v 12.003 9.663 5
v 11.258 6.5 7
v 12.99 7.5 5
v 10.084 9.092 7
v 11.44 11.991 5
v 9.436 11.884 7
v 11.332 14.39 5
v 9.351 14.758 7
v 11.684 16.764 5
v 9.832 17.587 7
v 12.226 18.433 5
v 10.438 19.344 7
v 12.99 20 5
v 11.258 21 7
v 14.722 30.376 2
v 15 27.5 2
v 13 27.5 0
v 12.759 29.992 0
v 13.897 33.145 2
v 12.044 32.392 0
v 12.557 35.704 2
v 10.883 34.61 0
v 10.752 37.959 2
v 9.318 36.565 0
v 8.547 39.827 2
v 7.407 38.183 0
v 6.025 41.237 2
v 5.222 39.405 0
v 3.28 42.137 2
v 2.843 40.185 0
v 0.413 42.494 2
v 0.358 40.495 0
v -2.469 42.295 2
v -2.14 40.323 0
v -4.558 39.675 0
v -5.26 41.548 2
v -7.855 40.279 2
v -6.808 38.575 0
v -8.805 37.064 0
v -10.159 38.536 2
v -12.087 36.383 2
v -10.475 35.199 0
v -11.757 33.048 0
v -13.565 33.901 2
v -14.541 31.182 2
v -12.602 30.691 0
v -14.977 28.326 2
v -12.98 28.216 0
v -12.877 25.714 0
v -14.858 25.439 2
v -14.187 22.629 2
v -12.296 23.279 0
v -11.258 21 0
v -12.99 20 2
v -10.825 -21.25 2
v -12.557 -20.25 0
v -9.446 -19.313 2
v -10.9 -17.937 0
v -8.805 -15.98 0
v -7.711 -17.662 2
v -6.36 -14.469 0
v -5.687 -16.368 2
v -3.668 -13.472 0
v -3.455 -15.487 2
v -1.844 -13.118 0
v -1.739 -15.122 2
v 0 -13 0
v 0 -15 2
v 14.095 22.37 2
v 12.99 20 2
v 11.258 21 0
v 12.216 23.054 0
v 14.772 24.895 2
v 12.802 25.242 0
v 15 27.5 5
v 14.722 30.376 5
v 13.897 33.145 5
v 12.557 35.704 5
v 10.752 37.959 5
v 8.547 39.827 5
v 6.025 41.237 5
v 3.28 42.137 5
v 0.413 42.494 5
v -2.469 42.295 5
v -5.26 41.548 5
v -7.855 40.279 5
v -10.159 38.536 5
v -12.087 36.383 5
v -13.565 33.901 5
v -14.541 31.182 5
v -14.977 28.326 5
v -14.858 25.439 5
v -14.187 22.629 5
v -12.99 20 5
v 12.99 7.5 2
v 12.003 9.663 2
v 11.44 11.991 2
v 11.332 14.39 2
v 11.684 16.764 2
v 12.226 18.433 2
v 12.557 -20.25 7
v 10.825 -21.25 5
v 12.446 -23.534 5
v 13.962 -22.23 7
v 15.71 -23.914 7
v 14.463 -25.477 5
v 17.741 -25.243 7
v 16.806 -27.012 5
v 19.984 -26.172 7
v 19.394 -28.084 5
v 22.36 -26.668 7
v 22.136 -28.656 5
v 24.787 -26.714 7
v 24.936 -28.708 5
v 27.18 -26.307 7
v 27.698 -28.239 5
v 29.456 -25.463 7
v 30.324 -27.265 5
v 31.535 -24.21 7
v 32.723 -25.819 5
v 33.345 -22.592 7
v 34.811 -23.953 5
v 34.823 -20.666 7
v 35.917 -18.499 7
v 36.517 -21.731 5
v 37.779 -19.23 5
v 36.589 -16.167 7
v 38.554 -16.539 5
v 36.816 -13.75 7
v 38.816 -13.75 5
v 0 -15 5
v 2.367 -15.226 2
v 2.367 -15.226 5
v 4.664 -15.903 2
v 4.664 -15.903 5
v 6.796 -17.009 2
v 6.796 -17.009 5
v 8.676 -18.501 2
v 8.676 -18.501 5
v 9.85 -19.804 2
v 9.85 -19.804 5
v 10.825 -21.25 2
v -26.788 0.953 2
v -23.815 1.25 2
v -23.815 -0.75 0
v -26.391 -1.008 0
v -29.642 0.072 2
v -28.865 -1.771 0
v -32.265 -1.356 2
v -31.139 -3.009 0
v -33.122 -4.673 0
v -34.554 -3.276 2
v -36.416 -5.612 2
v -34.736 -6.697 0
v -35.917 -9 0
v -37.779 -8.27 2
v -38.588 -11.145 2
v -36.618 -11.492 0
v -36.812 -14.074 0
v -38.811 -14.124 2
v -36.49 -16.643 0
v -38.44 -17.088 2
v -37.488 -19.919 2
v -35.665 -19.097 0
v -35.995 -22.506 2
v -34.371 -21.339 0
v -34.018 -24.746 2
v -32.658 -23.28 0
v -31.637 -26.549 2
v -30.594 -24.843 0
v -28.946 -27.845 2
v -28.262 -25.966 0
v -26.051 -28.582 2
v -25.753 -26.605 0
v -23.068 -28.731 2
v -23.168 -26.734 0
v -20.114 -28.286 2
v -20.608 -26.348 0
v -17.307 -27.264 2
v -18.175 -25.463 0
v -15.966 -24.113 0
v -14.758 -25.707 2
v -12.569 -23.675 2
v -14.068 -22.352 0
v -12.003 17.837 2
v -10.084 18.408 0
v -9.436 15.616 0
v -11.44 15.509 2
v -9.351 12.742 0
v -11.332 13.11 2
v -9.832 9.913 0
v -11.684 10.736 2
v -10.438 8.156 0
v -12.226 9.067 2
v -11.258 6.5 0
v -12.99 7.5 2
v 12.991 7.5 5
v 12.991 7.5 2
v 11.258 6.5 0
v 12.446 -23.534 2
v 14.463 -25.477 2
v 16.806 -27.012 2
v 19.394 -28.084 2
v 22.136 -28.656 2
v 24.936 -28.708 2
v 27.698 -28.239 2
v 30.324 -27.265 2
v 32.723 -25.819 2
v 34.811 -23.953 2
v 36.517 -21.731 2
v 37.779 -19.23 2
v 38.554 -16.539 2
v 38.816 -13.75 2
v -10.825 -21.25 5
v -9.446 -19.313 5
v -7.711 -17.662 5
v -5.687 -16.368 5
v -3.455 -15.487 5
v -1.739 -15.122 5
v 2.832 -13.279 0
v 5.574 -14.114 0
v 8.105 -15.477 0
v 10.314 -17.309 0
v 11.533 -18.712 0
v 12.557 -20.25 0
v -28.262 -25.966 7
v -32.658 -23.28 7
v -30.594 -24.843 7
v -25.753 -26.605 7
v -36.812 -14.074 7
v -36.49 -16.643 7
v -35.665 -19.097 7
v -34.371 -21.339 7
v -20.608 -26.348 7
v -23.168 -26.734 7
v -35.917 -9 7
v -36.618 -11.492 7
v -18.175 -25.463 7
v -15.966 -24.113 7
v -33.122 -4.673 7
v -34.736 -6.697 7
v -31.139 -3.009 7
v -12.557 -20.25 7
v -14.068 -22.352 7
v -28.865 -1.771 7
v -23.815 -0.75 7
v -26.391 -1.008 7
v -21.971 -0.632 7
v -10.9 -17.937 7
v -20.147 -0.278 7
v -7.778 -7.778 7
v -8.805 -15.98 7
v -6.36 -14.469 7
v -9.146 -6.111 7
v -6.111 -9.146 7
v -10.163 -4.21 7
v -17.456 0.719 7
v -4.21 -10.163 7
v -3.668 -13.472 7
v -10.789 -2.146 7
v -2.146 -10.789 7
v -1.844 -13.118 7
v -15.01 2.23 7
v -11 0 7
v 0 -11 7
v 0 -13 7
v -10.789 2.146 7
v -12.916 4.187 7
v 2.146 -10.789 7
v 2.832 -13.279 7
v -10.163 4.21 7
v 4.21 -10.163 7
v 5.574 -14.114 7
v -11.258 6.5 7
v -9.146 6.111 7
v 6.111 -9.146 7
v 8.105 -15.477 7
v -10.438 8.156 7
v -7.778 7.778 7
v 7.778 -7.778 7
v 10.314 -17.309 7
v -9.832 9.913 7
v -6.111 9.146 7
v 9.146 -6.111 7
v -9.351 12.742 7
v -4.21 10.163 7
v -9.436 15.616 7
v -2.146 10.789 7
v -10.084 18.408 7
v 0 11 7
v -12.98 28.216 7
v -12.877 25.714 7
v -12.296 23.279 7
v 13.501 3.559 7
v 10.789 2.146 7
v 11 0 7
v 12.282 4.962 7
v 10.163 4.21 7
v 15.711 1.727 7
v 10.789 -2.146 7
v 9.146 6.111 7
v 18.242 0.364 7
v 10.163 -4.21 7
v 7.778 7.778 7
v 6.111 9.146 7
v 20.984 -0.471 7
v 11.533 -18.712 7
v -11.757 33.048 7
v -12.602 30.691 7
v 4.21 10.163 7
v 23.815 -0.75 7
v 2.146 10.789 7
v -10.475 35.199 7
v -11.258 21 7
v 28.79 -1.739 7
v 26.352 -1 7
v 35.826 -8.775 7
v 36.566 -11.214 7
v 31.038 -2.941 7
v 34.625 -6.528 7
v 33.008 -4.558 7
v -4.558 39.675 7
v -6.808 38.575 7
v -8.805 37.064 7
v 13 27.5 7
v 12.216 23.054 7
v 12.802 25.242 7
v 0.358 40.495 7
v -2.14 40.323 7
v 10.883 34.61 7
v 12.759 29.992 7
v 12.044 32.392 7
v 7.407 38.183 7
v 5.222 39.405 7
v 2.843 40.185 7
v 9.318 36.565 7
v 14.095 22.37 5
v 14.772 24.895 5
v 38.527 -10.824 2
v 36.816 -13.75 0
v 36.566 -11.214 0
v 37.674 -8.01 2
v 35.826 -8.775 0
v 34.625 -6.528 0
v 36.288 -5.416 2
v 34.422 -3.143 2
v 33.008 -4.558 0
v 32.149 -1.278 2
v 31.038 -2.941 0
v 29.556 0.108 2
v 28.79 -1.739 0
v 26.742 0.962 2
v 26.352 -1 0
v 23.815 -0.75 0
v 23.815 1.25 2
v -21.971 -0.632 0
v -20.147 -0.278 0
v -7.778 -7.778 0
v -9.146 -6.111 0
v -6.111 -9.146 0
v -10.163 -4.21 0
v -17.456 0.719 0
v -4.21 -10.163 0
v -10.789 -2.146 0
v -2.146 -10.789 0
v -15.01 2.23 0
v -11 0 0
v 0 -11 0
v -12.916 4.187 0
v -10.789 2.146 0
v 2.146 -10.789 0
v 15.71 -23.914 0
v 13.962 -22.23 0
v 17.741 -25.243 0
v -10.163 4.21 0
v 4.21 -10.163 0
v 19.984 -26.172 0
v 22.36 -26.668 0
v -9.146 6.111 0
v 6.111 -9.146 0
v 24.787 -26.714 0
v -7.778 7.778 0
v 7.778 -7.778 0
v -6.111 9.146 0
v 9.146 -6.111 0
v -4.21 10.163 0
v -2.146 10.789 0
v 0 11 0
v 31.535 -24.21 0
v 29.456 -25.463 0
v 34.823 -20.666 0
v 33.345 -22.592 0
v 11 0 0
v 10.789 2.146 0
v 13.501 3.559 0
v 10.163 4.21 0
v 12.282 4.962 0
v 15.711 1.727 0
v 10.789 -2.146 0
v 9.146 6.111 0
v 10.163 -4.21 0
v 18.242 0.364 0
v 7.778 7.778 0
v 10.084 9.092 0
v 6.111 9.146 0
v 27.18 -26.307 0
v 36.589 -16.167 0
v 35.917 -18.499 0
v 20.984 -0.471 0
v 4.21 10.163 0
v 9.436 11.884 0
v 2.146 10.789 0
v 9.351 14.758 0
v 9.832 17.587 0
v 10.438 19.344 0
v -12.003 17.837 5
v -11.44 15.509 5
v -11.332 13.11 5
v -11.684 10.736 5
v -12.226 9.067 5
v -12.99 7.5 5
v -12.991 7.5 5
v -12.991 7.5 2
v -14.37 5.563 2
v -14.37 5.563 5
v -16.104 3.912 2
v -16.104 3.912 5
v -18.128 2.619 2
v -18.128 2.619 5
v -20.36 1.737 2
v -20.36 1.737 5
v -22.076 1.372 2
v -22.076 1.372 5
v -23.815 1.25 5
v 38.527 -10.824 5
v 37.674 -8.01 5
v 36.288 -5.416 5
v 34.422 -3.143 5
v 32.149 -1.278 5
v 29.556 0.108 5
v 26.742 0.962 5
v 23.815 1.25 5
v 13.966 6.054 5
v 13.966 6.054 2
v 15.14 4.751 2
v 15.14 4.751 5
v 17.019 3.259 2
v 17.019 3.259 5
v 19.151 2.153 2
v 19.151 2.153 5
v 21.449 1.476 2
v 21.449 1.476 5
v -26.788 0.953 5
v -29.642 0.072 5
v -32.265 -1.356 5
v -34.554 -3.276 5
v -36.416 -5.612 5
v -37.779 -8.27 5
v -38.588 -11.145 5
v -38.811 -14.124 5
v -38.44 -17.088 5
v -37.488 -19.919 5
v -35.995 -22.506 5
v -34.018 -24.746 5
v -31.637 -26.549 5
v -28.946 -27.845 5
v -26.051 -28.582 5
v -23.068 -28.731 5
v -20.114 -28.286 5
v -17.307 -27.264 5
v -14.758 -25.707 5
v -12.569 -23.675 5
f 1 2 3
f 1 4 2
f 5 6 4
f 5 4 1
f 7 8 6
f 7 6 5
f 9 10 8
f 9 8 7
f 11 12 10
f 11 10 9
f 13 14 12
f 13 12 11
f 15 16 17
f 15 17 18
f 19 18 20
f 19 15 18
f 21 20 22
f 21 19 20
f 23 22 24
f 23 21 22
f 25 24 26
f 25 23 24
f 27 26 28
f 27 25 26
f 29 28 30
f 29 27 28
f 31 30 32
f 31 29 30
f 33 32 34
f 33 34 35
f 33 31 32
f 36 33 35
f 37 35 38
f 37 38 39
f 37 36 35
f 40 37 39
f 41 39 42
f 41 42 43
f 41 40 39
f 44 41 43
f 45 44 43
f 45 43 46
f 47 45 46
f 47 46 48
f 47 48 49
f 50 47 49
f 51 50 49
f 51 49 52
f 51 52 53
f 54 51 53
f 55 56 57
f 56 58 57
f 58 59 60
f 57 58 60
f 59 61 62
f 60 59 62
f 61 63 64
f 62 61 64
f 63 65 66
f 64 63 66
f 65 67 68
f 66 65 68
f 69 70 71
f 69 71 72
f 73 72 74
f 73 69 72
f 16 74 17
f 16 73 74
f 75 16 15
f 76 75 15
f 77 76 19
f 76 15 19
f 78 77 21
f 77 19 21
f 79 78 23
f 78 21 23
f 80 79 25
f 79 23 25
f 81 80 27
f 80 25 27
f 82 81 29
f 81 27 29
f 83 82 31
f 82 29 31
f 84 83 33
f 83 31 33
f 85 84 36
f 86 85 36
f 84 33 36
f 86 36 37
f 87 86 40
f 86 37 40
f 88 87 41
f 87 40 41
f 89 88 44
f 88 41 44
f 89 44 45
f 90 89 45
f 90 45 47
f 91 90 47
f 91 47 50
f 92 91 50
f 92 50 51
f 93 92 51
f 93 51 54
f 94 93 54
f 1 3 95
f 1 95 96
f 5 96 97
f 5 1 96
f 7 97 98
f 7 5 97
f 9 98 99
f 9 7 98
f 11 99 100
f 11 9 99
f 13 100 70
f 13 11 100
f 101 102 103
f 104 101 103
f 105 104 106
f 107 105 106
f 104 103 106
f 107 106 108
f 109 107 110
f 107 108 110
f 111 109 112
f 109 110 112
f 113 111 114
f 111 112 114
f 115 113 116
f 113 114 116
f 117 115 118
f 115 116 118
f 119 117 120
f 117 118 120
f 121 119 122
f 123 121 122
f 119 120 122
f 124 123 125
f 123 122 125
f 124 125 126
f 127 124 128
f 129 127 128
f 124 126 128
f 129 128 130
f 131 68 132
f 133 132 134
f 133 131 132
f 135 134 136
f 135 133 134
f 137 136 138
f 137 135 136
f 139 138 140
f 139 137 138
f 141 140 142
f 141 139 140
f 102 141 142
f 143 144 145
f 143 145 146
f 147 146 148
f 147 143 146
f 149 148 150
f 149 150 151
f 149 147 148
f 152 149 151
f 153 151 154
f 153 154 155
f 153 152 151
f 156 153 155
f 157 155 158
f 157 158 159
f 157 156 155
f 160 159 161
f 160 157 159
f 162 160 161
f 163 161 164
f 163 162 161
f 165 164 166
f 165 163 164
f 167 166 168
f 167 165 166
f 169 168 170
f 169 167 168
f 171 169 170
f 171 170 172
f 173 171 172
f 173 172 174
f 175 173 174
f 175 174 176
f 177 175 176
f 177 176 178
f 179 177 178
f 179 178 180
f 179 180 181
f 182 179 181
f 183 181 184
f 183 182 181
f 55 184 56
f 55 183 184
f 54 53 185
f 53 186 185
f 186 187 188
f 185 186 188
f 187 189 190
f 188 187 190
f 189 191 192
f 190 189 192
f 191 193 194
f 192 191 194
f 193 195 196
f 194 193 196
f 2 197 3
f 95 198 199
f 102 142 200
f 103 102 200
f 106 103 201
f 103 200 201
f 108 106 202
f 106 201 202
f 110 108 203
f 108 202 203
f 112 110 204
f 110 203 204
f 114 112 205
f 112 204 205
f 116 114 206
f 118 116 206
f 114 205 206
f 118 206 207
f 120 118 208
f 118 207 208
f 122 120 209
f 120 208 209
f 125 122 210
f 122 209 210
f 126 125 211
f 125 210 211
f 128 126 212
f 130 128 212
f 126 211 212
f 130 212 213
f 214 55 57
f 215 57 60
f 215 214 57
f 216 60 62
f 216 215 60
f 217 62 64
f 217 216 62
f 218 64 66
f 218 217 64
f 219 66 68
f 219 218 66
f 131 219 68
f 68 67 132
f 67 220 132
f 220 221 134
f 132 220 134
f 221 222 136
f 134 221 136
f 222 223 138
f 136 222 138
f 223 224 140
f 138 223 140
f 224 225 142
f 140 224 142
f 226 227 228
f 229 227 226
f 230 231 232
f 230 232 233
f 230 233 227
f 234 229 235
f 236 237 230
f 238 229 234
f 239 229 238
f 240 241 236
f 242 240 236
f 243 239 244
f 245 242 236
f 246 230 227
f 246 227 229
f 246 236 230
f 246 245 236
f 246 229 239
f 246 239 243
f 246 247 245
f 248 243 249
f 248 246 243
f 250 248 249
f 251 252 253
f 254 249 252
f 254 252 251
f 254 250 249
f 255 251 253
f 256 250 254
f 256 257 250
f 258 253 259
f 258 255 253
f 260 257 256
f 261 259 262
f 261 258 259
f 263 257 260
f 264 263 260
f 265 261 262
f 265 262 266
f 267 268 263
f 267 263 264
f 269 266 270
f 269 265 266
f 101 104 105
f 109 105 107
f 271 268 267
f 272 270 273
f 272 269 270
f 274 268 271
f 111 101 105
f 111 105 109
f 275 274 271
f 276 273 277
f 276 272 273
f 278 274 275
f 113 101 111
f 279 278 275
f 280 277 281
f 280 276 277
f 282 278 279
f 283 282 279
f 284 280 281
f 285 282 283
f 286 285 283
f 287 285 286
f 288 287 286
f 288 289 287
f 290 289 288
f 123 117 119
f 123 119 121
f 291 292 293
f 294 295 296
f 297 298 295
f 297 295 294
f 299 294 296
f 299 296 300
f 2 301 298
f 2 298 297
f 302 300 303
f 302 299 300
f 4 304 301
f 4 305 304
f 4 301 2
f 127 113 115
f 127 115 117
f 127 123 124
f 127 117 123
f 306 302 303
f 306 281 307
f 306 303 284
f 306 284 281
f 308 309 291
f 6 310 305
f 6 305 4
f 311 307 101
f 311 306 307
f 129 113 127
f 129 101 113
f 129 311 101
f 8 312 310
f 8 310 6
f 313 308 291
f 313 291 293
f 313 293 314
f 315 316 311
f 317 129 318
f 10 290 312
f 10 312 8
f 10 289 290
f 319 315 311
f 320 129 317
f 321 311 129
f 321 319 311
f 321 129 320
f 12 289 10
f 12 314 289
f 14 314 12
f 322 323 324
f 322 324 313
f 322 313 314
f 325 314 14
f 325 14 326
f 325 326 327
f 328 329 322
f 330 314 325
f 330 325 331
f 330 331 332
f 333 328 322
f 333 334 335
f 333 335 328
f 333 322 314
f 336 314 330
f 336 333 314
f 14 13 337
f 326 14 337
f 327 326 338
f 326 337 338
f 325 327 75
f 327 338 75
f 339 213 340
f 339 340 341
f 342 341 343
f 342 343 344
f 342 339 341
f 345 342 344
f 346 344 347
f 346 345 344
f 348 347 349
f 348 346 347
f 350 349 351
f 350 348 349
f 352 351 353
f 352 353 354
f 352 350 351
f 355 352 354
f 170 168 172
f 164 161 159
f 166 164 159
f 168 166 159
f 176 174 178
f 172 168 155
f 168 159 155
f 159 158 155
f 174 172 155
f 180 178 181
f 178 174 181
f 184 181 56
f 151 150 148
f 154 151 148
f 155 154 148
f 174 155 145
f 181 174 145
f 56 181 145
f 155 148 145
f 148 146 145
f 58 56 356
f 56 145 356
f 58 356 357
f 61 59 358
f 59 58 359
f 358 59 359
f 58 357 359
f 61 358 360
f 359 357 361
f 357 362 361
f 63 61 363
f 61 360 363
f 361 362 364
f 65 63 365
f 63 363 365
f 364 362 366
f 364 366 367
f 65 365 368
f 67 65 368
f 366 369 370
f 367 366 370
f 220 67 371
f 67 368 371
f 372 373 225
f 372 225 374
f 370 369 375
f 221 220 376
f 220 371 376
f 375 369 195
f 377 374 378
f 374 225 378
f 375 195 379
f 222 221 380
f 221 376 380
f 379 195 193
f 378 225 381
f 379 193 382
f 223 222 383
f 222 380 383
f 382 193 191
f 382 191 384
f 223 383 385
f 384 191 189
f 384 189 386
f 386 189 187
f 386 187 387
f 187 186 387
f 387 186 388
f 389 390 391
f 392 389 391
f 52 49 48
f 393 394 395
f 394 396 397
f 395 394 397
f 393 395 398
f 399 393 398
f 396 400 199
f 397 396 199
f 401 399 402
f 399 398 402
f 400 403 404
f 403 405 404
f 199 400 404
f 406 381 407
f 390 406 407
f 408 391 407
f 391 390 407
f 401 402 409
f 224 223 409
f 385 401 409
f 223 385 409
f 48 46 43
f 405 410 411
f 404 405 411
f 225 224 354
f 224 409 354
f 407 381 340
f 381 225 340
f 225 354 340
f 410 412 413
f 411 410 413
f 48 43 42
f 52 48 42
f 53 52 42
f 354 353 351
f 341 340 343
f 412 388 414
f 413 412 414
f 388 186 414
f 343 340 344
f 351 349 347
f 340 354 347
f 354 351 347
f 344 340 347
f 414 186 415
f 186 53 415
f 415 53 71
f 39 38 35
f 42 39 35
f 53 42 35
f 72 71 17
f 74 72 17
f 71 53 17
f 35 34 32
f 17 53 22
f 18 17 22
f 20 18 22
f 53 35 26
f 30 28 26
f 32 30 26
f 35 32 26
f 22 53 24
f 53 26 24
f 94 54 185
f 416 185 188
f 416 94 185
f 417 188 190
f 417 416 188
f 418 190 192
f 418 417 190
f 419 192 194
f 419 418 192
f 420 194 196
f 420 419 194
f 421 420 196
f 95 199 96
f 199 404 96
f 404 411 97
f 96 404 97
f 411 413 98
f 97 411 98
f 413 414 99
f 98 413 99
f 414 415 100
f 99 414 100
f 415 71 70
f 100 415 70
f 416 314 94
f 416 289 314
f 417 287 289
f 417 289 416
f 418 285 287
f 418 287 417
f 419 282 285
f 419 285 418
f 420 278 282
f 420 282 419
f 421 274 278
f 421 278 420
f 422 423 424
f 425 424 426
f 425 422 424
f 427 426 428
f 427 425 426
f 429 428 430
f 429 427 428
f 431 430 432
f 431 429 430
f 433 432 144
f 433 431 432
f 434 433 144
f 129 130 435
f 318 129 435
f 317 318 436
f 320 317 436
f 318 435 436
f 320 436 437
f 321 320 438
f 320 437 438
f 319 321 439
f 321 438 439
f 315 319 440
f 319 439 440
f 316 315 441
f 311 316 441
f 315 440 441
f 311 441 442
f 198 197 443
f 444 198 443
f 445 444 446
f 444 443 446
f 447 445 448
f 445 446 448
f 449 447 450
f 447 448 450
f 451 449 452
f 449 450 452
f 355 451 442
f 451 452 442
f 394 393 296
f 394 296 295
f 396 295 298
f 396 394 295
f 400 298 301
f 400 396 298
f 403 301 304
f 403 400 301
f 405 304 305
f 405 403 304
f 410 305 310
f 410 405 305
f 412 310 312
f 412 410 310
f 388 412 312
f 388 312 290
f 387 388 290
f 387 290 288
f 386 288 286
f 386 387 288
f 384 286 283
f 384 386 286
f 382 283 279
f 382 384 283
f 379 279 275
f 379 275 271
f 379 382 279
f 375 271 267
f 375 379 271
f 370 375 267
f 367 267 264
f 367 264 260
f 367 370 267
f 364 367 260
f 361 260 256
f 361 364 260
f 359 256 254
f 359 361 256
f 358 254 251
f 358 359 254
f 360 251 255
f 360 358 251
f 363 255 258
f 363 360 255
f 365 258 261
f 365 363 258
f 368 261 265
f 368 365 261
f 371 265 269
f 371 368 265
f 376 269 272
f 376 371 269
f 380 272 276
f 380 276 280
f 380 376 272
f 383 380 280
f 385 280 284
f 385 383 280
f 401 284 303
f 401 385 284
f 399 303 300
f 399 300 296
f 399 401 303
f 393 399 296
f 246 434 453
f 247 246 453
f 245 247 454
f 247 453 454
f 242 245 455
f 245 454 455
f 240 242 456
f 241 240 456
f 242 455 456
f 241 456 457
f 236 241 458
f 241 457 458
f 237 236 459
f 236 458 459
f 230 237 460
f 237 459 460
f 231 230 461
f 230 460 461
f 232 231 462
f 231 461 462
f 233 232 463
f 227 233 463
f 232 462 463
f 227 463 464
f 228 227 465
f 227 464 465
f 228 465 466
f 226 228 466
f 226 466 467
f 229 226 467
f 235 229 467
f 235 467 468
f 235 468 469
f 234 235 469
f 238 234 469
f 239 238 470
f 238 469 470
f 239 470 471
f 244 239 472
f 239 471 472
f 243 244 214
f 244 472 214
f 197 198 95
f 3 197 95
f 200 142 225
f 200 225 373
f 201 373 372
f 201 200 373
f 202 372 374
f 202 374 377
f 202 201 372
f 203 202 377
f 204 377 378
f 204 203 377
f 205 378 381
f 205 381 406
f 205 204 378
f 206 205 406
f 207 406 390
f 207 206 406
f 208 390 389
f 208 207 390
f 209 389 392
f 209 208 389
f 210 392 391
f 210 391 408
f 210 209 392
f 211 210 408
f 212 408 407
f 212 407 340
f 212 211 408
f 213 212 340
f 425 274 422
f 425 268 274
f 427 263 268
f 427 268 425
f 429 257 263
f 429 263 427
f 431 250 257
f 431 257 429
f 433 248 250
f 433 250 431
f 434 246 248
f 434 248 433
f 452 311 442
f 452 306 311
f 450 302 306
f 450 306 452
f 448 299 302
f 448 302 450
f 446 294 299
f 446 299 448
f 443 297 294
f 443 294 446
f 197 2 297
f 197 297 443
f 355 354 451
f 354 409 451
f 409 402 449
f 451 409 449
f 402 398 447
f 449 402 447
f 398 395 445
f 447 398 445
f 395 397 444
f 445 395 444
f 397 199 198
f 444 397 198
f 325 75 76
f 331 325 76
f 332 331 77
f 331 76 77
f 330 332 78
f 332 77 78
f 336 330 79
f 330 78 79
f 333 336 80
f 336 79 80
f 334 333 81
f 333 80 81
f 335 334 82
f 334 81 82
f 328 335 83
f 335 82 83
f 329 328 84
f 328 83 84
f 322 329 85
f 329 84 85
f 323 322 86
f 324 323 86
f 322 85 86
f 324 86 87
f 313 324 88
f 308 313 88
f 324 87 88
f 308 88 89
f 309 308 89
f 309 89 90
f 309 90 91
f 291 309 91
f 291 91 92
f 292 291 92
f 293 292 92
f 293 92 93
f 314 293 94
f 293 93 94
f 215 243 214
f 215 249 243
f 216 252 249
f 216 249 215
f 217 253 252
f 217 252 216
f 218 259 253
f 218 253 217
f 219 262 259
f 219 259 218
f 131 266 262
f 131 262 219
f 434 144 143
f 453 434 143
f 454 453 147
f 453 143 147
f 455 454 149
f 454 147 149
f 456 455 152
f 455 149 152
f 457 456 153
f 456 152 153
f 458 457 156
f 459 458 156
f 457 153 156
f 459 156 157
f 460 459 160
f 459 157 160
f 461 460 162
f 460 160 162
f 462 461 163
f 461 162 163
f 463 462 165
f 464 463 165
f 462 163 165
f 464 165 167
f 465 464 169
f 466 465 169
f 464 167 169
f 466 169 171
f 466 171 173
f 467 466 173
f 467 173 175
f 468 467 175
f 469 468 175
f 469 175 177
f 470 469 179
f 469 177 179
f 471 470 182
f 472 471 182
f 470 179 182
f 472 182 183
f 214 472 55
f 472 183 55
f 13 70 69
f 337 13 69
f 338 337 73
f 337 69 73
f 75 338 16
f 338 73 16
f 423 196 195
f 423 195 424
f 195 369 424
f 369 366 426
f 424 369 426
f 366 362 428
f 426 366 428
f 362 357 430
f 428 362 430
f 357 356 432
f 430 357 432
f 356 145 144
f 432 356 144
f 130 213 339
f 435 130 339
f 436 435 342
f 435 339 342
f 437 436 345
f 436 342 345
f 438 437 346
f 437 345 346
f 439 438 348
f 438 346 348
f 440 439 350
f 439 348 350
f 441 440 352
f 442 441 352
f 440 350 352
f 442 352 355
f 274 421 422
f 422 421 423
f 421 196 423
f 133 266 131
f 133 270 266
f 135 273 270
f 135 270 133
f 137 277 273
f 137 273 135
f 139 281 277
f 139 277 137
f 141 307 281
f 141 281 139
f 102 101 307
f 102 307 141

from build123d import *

# Parameters (mm, degrees)
F0_R     = 11
F1_DEPTH = 7
F2_R     = 12.499
F3_SIZE  = 2


# Not quite as in the source:
# - a fillet or chamfer is up to 0.001 mm smaller than in the source, because OpenCascade refuses the exact size


with BuildPart() as f1:
    # F0 (on Top) → F1 (new body)
    with BuildSketch(Plane.XY):
        with BuildLine():
            ThreePointArc((14.9052440041, -1.6833600857), (14.9762922658, -0.8430124372), (15, 0))
            ThreePointArc((15, 0), (12.5483433381, 8.2182163192), (5.9947894041, 13.75))
            ThreePointArc((5.9947894041, 13.75), (0, 12.5), (-5.9947894041, 13.75))
            ThreePointArc((-5.9947894041, 13.75), (-12.9903810568, 7.5), (-14.9052440041, -1.6833600857))
            ThreePointArc((-14.9052440041, -1.6833600857), (-10.8253175473, -6.25), (-8.9104546, -12.0666399143))
            ThreePointArc((-8.9104546, -12.0666399143), (0, -15), (8.9104546, -12.0666399143))
            ThreePointArc((8.9104546, -12.0666399143), (10.8253175473, -6.25), (14.9052440041, -1.6833600857))
        make_face()
        Circle(F0_R, mode=Mode.SUBTRACT)
        with BuildLine():
            ThreePointArc((-5.9947894041, 13.75), (0, 12.5), (5.9947894041, 13.75))
            ThreePointArc((5.9947894041, 13.75), (0, 15), (-5.9947894041, 13.75))
        make_face()
        with BuildLine():
            ThreePointArc((-5.9947894041, 13.75), (0, 15), (5.9947894041, 13.75))
            ThreePointArc((5.9947894041, 13.75), (12.5483433381, 19.2817836808), (15, 27.5))
            ThreePointArc((15, 27.5), (-8.2182163192, 40.0483433381), (-5.9947894041, 13.75))
        make_face()
        with BuildLine():
            ThreePointArc((38.8156986041, -13.75), (30.5737745507, -0.3586442247), (14.9052440041, -1.6833600857))
            ThreePointArc((14.9052440041, -1.6833600857), (12.9903810568, -7.5), (8.9104546, -12.0666399143))
            ThreePointArc((8.9104546, -12.0666399143), (22.9726861669, -28.7262922658), (38.8156986041, -13.75))
        make_face()
        with BuildLine():
            ThreePointArc((8.9104546, -12.0666399143), (12.9903810568, -7.5), (14.9052440041, -1.6833600857))
            ThreePointArc((14.9052440041, -1.6833600857), (10.8253175473, -6.25), (8.9104546, -12.0666399143))
        make_face()
        with BuildLine():
            ThreePointArc((-8.9104546, -12.0666399143), (-10.8253175473, -6.25), (-14.9052440041, -1.6833600857))
            ThreePointArc((-14.9052440041, -1.6833600857), (-12.9903810568, -7.5), (-8.9104546, -12.0666399143))
        make_face()
        with BuildLine():
            ThreePointArc((-8.9104546, -12.0666399143), (-12.9903810568, -7.5), (-14.9052440041, -1.6833600857))
            ThreePointArc((-14.9052440041, -1.6833600857), (-37.2070543793, -20.5080759466), (-8.8156986041, -13.75))
            ThreePointArc((-8.8156986041, -13.75), (-8.8394063383, -12.9069875628), (-8.9104546, -12.0666399143))
        make_face()
    extrude(amount=F1_DEPTH)

    # F2 (radius 12.5 in the source; OpenCascade refuses exactly that, so slightly less here)
    f2_edges = [f1.edges().sort_by_distance(p)[0] for p in [
        (-5.994789, 13.75, 3.5),
        (14.905244, -1.68336, 3.5),
        (-14.905244, -1.68336, 3.5),
        (5.994789, 13.75, 3.5),
        (-8.910455, -12.06664, 3.5),
        (8.910455, -12.06664, 3.5),
    ]]
    fillet(f2_edges, radius=F2_R)

    # F3
    f3_edges = [f1.edges().sort_by_distance(p)[0] for p in [
        (-6.250077, -16.674548, 0),
        (-6.250077, -16.674548, 7),
    ]]
    chamfer(f3_edges, length=F3_SIZE)


solid = f1.part
